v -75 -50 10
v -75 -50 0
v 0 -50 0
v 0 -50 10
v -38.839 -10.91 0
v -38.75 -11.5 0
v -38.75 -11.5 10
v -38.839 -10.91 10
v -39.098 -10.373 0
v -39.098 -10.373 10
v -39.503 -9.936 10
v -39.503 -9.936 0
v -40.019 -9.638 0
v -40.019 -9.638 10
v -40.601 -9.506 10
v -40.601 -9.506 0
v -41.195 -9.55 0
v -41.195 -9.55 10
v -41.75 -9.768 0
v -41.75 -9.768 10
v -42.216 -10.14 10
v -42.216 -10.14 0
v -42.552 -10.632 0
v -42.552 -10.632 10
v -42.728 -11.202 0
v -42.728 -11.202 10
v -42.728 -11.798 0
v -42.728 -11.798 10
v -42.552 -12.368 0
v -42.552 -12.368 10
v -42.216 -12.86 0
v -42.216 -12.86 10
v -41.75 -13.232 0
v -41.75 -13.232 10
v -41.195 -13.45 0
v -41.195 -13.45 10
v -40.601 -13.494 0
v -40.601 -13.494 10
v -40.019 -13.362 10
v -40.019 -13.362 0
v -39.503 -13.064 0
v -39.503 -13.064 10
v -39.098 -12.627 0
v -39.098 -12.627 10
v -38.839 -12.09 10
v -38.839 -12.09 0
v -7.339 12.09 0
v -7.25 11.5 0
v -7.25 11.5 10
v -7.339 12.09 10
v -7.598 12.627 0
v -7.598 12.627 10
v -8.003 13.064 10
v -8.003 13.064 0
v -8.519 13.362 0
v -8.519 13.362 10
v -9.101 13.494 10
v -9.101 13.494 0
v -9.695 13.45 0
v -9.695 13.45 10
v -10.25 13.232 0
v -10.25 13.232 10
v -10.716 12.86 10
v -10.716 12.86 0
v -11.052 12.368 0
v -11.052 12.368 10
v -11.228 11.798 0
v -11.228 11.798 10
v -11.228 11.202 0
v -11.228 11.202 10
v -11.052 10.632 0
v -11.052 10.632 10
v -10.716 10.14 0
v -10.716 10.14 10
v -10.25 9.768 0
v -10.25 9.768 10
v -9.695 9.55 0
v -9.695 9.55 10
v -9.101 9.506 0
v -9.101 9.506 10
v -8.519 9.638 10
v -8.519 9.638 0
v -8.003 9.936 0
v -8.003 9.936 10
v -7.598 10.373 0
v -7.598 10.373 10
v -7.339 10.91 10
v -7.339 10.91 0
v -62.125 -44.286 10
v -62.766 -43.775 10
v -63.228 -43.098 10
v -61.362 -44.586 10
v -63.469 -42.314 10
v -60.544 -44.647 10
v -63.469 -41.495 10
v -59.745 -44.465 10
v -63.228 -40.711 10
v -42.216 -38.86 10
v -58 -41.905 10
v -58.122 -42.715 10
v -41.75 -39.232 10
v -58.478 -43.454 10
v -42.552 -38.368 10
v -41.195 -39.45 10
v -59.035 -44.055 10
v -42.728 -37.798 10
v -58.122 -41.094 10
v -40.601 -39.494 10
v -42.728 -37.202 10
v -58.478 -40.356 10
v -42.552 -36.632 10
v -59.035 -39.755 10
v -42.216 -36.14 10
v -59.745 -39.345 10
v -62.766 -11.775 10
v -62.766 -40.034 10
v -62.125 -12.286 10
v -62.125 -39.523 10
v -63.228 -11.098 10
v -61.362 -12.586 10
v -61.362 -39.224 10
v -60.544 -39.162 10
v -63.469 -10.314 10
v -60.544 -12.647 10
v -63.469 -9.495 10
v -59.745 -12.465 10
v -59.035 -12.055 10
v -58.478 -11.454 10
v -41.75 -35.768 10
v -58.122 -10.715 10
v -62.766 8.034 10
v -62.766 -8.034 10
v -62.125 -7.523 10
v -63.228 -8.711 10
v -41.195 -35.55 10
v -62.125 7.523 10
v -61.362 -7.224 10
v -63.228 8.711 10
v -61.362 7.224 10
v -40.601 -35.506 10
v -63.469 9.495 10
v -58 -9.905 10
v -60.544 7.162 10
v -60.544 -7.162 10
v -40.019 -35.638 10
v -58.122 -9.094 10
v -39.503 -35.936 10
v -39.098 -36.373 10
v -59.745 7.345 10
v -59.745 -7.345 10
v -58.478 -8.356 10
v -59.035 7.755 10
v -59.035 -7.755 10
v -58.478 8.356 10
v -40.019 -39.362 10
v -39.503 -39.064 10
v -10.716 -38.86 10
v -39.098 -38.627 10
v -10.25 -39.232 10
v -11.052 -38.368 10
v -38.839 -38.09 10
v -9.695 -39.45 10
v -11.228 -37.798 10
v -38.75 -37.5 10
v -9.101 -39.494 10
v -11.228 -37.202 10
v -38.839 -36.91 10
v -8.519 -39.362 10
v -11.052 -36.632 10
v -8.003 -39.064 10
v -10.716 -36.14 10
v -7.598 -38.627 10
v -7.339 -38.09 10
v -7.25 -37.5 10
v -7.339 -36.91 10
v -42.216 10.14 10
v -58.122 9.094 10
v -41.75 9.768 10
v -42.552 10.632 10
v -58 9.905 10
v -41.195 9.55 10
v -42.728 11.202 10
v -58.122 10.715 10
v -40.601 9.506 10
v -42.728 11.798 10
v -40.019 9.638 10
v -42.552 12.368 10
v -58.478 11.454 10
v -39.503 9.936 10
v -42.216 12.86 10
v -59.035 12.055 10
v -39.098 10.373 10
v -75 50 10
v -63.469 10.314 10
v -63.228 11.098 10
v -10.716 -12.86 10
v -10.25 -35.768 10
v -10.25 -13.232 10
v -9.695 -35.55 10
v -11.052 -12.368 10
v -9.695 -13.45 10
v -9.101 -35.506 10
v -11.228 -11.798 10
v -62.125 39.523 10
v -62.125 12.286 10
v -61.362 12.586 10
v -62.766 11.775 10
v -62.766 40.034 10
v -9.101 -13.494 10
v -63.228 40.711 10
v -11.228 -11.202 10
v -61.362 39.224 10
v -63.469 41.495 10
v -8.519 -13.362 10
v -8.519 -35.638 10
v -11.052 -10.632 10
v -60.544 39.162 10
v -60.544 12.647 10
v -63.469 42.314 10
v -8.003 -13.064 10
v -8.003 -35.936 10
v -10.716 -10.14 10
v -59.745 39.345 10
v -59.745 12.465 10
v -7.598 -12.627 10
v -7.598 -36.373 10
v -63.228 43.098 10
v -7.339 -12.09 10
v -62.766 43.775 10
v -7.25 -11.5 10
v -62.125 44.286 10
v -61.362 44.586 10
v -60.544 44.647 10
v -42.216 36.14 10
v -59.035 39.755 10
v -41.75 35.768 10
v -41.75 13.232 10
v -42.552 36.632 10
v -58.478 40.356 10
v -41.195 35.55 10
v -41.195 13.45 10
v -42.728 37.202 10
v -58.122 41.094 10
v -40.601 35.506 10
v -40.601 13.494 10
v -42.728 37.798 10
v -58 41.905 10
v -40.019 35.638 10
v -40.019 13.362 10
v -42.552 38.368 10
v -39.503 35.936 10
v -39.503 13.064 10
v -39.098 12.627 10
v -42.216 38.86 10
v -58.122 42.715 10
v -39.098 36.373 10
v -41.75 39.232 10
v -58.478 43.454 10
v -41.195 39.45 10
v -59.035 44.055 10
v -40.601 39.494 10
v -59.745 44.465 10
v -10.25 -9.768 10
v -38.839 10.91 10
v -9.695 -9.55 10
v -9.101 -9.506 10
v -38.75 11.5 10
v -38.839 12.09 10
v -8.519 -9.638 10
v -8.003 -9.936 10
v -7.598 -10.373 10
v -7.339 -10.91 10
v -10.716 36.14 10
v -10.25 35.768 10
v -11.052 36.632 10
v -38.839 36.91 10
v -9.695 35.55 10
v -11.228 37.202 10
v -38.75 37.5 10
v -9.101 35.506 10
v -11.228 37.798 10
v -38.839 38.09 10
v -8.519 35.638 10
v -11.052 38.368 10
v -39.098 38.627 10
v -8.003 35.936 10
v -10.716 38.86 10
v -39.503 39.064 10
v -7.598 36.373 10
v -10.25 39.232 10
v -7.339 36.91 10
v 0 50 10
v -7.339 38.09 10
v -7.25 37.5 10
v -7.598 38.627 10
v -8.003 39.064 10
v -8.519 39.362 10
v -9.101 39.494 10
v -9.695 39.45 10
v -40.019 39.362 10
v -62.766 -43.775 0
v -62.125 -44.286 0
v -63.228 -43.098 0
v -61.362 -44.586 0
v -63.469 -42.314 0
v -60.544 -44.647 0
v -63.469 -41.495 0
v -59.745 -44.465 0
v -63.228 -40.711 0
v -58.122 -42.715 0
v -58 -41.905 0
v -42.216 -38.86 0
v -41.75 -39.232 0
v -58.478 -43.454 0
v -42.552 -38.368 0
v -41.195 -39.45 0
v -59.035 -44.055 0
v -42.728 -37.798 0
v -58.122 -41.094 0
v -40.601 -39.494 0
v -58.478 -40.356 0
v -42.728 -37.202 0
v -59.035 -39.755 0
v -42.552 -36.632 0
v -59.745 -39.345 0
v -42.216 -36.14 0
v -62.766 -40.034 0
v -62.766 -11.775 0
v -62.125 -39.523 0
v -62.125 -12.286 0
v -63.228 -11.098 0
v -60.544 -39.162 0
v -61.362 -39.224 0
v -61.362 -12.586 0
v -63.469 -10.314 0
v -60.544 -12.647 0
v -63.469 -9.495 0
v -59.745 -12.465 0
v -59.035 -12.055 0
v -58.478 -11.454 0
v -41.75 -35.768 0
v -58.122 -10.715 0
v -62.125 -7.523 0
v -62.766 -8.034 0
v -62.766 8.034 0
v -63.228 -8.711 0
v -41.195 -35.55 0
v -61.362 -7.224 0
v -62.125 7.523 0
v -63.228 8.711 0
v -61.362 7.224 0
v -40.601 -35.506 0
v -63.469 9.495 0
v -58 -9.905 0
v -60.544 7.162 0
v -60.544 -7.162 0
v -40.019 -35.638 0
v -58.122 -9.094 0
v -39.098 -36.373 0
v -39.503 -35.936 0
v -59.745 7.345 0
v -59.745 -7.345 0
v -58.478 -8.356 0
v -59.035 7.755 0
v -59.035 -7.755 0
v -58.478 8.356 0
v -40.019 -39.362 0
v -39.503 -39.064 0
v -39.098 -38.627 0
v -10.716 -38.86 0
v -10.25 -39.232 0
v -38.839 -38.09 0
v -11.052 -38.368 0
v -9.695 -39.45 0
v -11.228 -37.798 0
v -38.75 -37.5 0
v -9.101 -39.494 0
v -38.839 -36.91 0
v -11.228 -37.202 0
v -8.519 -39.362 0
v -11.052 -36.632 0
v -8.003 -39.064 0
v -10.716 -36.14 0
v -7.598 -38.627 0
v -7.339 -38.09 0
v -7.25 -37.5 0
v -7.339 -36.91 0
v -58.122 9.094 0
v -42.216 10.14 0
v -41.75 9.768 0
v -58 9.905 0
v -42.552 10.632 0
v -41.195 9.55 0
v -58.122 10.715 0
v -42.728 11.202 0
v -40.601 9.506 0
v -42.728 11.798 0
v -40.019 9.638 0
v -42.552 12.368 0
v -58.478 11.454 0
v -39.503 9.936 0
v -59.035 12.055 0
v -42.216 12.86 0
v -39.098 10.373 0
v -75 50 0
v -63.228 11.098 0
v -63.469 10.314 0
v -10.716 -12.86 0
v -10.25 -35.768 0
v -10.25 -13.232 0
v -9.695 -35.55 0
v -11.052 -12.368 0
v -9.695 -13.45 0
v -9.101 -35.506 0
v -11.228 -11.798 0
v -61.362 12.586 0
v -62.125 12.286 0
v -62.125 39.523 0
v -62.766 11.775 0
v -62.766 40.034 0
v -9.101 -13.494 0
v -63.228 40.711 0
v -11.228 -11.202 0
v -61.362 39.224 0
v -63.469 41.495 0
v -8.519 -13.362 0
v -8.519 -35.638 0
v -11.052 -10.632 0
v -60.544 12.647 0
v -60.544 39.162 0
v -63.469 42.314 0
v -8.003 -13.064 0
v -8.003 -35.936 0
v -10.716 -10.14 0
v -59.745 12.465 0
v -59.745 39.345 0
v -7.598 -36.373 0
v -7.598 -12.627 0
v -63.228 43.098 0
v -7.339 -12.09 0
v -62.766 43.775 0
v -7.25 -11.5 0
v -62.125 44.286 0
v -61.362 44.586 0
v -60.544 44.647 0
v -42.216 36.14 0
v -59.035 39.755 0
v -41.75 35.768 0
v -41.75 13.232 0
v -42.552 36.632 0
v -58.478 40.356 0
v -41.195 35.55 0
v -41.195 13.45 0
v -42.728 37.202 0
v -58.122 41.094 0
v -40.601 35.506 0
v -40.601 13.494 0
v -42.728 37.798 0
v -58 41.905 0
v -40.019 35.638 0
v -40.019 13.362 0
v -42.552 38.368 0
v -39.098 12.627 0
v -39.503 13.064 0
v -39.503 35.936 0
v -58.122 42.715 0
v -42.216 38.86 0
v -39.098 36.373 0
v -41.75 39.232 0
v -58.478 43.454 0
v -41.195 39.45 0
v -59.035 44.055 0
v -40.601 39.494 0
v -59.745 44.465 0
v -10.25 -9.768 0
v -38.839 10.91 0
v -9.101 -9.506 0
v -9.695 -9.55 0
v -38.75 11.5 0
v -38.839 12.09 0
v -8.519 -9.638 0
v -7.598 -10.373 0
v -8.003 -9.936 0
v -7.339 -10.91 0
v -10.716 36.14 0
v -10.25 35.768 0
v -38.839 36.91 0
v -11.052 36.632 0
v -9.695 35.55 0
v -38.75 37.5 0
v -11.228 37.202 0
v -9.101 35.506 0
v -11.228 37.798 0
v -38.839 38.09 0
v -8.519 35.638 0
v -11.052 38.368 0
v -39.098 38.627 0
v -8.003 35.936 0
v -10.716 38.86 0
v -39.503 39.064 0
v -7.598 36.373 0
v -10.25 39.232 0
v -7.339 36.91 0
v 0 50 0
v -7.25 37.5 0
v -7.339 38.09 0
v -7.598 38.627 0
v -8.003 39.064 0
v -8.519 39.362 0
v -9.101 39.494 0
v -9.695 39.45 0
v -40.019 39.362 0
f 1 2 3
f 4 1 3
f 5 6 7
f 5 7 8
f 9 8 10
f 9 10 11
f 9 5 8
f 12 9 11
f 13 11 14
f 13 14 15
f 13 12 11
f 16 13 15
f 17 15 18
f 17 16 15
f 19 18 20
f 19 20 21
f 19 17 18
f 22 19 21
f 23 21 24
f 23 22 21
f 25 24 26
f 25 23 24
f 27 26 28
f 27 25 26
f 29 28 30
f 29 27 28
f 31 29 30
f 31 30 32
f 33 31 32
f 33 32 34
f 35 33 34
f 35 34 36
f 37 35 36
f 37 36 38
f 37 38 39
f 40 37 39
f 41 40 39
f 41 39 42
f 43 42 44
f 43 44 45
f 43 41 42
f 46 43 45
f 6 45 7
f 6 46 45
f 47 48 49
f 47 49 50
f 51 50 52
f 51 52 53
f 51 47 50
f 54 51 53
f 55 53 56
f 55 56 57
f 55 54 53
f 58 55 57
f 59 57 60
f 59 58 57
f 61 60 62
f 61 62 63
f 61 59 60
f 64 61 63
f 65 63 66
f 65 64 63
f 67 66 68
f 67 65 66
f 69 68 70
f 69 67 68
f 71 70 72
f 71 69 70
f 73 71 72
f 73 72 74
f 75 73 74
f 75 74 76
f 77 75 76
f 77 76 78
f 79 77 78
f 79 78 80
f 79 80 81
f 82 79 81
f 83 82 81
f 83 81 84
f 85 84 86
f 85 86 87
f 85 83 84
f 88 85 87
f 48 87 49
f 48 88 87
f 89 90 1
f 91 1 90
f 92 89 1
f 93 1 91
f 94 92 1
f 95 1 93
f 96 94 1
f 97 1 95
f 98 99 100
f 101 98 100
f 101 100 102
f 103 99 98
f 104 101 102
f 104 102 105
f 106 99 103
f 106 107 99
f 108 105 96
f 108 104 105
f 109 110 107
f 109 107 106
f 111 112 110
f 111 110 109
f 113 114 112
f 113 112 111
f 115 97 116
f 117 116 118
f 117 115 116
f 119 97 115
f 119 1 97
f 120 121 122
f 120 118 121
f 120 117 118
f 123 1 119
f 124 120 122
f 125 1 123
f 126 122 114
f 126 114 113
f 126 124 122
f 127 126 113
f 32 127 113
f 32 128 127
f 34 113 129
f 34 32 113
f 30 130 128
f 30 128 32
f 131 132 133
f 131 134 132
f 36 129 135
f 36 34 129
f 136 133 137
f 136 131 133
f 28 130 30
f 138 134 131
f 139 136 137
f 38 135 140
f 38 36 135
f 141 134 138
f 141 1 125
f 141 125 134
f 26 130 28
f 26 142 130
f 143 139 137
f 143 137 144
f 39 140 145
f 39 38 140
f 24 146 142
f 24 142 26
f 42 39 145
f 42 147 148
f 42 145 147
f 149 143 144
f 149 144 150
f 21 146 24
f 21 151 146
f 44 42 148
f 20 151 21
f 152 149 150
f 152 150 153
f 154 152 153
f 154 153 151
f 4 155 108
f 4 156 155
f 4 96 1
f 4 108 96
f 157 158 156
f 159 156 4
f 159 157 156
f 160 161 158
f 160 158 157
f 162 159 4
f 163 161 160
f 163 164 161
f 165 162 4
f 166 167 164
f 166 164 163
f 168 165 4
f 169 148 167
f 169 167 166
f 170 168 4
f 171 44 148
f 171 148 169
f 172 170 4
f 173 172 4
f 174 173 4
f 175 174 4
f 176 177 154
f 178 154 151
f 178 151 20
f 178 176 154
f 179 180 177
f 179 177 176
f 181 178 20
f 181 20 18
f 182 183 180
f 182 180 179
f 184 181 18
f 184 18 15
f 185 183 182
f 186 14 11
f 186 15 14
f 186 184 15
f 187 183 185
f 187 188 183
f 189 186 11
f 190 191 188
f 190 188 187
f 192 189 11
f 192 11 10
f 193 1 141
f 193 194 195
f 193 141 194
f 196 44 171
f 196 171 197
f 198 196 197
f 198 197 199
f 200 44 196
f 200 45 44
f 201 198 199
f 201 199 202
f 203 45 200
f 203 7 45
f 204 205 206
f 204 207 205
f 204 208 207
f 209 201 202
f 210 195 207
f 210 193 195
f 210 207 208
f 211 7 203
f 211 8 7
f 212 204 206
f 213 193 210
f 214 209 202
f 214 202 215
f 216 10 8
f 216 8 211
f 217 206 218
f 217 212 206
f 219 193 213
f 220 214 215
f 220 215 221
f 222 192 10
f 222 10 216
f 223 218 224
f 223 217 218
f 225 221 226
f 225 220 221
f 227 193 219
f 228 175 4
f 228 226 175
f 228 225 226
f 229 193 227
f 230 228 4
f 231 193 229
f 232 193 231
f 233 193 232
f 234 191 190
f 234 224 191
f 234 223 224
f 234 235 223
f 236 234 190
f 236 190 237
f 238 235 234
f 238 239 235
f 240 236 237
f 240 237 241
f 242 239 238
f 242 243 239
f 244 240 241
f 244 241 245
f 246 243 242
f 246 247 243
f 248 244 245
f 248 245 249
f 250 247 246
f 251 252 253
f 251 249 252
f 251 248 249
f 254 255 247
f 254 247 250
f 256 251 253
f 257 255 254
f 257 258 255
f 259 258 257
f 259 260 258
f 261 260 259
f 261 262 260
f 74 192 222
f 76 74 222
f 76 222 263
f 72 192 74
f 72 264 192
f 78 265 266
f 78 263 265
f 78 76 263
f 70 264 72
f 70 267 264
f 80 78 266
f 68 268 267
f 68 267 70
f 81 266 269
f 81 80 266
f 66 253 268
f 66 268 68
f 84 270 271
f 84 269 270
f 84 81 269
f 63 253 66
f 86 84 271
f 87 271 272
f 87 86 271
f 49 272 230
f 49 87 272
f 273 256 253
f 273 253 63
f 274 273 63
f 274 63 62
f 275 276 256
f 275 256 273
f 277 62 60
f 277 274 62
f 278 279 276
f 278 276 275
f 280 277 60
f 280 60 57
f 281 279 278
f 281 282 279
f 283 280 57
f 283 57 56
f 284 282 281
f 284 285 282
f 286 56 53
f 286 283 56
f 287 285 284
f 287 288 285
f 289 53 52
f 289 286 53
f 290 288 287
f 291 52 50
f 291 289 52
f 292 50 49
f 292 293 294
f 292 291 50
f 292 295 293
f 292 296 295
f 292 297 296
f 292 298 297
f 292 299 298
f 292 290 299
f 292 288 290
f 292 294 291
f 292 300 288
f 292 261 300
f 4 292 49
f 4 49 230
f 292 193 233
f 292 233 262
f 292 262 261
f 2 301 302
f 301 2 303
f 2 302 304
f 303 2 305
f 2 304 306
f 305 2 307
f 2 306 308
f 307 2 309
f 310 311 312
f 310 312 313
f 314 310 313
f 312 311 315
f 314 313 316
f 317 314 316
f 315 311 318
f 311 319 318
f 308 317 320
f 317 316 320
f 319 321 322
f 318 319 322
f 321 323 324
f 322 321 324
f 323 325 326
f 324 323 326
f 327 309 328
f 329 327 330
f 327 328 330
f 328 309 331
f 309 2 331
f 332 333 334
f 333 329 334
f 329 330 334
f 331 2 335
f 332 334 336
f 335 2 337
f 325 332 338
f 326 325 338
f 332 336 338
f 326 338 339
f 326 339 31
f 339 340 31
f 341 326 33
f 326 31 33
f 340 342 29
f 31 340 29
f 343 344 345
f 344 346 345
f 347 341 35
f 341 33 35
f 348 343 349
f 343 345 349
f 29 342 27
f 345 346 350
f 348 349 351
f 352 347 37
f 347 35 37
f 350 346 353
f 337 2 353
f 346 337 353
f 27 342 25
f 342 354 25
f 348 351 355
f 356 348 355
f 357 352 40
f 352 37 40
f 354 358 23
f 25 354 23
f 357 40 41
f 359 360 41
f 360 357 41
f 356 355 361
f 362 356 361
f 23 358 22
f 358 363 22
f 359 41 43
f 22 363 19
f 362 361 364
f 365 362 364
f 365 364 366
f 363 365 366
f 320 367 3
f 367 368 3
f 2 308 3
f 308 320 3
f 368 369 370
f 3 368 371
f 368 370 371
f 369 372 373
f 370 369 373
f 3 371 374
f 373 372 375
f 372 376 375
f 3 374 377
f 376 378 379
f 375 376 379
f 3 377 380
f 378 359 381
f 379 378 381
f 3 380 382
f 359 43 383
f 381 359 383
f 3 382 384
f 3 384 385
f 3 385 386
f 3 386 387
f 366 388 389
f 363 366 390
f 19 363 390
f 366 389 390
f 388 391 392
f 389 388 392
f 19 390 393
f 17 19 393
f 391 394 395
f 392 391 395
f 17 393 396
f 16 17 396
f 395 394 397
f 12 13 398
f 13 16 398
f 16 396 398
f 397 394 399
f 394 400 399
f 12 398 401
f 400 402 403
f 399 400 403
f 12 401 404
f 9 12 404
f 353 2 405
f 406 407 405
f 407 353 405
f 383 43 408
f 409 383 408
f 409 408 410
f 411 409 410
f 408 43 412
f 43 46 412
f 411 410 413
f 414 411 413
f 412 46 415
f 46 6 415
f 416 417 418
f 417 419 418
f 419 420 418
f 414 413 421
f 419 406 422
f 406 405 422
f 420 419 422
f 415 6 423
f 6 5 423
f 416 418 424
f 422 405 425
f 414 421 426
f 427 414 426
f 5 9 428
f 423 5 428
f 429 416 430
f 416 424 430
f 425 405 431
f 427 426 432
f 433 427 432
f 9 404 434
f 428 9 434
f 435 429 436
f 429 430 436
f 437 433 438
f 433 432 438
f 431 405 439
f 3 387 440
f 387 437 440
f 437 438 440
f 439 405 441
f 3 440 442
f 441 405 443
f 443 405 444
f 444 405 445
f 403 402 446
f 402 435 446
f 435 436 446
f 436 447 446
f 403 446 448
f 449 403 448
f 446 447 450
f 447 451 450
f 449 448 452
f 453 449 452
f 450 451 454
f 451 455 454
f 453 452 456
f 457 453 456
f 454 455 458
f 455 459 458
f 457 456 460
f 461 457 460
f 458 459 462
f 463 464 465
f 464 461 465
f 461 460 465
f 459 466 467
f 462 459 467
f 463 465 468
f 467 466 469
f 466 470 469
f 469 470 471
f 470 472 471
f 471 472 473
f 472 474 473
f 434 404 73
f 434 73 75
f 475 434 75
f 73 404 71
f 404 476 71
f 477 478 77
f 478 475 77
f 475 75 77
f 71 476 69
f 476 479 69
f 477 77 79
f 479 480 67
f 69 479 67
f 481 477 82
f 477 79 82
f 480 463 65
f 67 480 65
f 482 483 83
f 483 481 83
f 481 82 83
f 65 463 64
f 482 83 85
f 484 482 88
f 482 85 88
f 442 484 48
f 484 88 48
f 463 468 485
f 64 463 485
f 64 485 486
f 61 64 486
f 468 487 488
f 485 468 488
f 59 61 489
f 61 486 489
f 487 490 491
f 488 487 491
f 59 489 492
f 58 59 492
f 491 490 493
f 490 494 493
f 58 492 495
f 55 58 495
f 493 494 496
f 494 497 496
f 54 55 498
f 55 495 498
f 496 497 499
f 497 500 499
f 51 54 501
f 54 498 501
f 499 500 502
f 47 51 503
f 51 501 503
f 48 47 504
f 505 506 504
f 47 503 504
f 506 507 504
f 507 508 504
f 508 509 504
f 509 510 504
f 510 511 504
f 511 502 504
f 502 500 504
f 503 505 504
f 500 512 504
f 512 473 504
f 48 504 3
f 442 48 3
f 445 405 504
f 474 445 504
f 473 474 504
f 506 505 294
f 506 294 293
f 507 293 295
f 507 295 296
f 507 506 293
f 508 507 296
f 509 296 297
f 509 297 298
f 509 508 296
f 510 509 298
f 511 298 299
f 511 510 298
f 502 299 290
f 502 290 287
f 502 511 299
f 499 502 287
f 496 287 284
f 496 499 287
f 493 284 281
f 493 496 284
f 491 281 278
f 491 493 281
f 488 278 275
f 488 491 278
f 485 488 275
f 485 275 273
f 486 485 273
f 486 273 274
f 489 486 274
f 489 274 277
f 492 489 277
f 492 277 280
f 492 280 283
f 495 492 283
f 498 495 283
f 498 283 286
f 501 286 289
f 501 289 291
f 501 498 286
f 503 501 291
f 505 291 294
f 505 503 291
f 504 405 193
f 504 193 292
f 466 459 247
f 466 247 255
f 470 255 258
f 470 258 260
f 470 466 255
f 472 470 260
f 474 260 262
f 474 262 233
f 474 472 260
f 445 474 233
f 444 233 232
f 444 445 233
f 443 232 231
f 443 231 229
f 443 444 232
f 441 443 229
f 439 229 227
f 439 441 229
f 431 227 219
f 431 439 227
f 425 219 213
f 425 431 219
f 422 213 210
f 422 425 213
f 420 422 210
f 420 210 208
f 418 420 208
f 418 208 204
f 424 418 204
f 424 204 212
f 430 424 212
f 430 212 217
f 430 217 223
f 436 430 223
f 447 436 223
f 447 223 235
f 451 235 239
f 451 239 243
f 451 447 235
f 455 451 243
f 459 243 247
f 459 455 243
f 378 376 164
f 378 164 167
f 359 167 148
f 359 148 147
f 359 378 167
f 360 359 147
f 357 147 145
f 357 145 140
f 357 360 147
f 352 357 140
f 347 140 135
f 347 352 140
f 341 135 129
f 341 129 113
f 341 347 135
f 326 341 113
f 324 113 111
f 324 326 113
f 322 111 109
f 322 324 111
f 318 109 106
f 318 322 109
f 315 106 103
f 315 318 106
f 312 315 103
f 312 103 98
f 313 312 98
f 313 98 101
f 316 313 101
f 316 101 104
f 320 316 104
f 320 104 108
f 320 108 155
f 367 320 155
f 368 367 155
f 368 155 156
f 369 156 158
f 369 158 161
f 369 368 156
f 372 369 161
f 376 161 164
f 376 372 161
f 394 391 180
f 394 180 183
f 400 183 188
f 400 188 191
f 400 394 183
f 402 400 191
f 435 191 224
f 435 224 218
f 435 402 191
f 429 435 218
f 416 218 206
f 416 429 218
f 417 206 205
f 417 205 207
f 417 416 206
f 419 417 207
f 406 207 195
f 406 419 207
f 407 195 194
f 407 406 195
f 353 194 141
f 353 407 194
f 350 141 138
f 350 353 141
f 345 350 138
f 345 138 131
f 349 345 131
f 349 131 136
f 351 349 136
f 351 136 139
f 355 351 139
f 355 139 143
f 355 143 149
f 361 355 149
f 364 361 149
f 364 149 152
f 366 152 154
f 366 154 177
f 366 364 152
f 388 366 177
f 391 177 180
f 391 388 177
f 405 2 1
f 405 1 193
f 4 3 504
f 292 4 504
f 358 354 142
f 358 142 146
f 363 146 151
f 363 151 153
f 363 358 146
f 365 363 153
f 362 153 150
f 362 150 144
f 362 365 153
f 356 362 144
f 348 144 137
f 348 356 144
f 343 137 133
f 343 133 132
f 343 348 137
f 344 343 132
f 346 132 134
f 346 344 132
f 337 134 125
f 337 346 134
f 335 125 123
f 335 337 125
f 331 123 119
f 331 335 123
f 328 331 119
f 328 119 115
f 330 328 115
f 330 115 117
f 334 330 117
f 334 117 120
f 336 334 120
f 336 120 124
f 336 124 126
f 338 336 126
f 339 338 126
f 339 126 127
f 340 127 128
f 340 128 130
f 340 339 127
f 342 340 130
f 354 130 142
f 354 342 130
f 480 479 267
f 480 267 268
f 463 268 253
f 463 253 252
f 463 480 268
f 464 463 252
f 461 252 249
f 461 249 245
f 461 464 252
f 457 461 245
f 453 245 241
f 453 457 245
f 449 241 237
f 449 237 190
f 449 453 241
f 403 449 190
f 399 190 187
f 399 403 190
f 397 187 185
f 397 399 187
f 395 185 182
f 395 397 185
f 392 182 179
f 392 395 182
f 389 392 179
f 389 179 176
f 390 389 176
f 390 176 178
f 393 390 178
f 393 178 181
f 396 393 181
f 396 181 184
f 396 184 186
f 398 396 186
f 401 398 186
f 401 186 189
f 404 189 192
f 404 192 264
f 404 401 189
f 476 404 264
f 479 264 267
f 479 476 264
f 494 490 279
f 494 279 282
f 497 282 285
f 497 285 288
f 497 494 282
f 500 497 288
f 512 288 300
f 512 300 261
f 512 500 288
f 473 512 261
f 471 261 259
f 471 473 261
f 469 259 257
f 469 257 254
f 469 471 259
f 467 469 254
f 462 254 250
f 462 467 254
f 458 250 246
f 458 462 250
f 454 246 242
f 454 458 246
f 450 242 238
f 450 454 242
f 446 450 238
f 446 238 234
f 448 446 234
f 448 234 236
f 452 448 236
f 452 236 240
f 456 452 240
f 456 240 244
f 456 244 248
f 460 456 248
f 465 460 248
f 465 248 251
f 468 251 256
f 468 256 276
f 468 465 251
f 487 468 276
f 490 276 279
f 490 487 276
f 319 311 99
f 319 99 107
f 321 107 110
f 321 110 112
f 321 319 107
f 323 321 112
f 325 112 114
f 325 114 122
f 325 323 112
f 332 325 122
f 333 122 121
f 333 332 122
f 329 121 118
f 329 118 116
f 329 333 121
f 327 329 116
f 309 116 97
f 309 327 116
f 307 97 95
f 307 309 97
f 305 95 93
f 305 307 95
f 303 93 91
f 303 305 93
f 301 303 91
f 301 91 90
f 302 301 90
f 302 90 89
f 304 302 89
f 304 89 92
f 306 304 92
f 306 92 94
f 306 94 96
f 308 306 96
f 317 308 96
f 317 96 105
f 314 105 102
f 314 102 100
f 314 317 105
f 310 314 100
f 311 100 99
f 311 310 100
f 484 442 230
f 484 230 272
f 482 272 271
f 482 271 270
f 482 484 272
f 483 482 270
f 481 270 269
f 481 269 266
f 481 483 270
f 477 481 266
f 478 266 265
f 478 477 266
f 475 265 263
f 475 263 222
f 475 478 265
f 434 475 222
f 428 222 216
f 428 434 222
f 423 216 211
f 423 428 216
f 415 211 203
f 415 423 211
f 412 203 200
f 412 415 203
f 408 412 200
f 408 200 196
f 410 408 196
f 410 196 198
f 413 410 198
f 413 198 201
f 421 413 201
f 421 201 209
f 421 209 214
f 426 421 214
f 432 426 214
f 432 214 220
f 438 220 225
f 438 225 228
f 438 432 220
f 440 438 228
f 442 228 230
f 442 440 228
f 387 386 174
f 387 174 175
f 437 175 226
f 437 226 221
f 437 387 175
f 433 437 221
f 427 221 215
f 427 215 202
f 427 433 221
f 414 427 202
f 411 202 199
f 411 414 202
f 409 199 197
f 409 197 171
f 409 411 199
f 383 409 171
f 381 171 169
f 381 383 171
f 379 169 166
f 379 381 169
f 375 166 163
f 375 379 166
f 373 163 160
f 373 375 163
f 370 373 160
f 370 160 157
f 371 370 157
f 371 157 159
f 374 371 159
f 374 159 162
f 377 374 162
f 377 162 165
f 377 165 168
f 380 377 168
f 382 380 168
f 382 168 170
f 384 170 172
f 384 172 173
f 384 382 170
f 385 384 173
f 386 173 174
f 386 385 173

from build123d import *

# Parameters (mm, degrees)
SKETCH1_W           = 75
SKETCH1_H           = 100
SKETCH1_R           = 2
SKETCH1_R_2         = 2.75
BOSS_EXTRUDE1_DEPTH = 10


with BuildPart() as part:
    # Sketch1 → Boss-Extrude1 (new body)
    with BuildSketch(Plane.XY):
        with Locations((-37.5, 0)):
            Rectangle(SKETCH1_W, SKETCH1_H)
        with Locations((-40.75, 37.5)):
            Circle(SKETCH1_R, mode=Mode.SUBTRACT)
        with Locations((-9.25, 37.5)):
            Circle(SKETCH1_R, mode=Mode.SUBTRACT)
        with Locations((-40.75, 11.5)):
            Circle(SKETCH1_R, mode=Mode.SUBTRACT)
        with Locations((-9.25, 11.5)):
            Circle(SKETCH1_R, mode=Mode.SUBTRACT)
        with Locations((-40.75, -11.5)):
            Circle(SKETCH1_R, mode=Mode.SUBTRACT)
        with Locations((-9.25, -11.5)):
            Circle(SKETCH1_R, mode=Mode.SUBTRACT)
        with Locations((-9.25, -37.5)):
            Circle(SKETCH1_R, mode=Mode.SUBTRACT)
        with Locations((-40.75, -37.5)):
            Circle(SKETCH1_R, mode=Mode.SUBTRACT)
        with Locations((-60.75, 41.904631992)):
            Circle(SKETCH1_R_2, mode=Mode.SUBTRACT)
        with Locations((-60.75, 9.904631992)):
            Circle(SKETCH1_R_2, mode=Mode.SUBTRACT)
        with Locations((-60.75, -9.904631992)):
            Circle(SKETCH1_R_2, mode=Mode.SUBTRACT)
        with Locations((-60.75, -41.904631992)):
            Circle(SKETCH1_R_2, mode=Mode.SUBTRACT)
    extrude(amount=BOSS_EXTRUDE1_DEPTH)


solid = part.part
